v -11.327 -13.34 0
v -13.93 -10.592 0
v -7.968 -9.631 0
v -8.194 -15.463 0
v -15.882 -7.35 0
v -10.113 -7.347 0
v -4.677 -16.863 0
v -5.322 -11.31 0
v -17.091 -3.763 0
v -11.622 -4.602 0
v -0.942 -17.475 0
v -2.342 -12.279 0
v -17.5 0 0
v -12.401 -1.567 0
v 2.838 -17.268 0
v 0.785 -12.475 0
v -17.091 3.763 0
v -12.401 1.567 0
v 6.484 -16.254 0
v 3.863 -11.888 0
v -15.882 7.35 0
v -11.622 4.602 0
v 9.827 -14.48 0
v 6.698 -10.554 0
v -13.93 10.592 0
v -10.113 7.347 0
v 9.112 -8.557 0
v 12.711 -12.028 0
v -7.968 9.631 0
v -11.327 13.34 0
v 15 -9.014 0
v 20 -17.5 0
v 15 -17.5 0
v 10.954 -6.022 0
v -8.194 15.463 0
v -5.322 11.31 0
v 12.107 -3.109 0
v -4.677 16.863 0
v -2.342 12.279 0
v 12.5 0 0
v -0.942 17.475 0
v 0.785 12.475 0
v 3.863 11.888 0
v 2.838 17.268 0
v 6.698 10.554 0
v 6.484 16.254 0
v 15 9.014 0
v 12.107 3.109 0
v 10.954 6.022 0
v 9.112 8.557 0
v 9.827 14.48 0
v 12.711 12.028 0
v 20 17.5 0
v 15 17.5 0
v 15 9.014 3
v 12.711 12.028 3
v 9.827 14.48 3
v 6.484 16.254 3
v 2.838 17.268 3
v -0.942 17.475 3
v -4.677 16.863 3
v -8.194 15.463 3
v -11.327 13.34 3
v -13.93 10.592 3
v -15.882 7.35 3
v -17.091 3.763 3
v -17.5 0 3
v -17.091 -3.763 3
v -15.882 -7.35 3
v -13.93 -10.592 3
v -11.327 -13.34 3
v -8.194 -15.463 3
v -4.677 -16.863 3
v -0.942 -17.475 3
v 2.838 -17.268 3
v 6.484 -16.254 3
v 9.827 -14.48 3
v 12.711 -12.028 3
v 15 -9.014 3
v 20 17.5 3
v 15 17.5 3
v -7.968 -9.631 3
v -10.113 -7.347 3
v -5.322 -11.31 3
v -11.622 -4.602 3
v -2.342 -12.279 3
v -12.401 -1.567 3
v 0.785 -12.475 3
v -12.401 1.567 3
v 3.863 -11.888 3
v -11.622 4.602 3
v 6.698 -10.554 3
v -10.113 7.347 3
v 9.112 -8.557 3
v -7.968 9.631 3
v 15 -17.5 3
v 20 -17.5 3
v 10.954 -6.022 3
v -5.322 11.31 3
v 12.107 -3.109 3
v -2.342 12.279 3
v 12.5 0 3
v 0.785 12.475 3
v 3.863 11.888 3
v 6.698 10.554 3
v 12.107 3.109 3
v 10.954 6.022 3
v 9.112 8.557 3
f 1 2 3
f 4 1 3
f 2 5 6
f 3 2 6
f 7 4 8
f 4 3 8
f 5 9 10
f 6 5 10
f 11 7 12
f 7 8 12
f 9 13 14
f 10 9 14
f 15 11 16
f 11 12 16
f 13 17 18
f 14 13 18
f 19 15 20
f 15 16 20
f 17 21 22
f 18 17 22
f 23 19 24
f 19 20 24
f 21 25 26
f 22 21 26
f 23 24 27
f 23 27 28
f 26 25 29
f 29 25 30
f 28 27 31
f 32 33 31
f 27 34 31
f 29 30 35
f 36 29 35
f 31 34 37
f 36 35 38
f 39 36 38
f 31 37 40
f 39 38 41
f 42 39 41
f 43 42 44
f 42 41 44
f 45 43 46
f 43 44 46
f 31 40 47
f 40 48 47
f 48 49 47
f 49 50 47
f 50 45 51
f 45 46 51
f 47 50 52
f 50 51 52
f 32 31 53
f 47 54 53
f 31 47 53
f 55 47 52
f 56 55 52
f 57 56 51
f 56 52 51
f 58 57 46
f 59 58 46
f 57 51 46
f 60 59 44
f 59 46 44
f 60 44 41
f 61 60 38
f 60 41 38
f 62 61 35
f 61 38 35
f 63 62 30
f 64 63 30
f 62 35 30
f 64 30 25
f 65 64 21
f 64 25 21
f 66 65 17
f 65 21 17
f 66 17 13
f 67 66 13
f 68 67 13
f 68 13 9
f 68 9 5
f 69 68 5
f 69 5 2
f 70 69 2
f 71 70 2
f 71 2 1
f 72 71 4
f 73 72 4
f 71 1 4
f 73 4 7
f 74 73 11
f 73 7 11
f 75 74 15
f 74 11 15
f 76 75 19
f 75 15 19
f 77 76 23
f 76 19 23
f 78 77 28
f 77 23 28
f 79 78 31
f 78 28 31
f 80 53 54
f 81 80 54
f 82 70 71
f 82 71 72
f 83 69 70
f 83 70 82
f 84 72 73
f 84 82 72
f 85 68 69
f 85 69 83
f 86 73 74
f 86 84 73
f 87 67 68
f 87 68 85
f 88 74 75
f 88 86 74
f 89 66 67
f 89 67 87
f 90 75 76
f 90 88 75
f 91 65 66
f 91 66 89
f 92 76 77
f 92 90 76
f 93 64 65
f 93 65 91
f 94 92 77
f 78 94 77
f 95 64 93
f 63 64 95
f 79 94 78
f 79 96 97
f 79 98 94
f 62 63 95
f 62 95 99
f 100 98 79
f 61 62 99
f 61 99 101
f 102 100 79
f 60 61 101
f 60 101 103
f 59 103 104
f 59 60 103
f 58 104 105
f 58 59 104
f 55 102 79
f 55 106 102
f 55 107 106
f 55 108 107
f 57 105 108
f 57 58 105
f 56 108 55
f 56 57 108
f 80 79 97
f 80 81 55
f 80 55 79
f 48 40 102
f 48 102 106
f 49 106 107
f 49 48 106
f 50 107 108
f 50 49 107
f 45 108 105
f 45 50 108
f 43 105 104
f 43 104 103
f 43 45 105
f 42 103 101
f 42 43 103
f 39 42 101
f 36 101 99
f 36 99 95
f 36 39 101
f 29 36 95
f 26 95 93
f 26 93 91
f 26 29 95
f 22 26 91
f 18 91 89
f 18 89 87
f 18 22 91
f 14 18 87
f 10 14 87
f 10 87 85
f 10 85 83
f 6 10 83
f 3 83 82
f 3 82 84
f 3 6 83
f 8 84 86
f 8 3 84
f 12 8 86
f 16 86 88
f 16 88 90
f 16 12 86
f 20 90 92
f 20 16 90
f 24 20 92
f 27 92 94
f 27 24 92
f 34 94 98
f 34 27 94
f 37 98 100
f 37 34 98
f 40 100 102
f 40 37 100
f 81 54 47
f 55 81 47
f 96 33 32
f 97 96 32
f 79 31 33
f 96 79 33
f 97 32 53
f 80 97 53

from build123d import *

# Parameters (mm, degrees)
F0_R     = 12.5
F1_DEPTH = 3


with BuildPart() as f1:
    # F0 (on Top) → F1 (new body)
    with BuildSketch(Plane.XY):
        with BuildLine():
            Line((15, -9.0138781887), (15, 9.0138781887))
            ThreePointArc((15, 9.0138781887), (-17.5, 0), (15, -9.0138781887))
        make_face()
        Circle(F0_R, mode=Mode.SUBTRACT)
        with BuildLine():
            ThreePointArc((15, -9.0138781887), (16.863421954, -4.6770717335), (17.5, 0))
            ThreePointArc((17.5, 0), (16.863421954, 4.6770717335), (15, 9.0138781887))
            Line((15, 9.0138781887), (15, -9.0138781887))
        make_face()
        with BuildLine():
            ThreePointArc((15, 9.0138781887), (16.863421954, 4.6770717335), (17.5, 0))
            ThreePointArc((17.5, 0), (16.863421954, -4.6770717335), (15, -9.0138781887))
            Line((15, -9.0138781887), (15, -17.5))
            Line((15, -17.5), (20, -17.5))
            Line((20, -17.5), (20, 17.5))
            Line((20, 17.5), (15, 17.5))
            Line((15, 17.5), (15, 9.0138781887))
        make_face()
    extrude(amount=F1_DEPTH)


solid = f1.part
